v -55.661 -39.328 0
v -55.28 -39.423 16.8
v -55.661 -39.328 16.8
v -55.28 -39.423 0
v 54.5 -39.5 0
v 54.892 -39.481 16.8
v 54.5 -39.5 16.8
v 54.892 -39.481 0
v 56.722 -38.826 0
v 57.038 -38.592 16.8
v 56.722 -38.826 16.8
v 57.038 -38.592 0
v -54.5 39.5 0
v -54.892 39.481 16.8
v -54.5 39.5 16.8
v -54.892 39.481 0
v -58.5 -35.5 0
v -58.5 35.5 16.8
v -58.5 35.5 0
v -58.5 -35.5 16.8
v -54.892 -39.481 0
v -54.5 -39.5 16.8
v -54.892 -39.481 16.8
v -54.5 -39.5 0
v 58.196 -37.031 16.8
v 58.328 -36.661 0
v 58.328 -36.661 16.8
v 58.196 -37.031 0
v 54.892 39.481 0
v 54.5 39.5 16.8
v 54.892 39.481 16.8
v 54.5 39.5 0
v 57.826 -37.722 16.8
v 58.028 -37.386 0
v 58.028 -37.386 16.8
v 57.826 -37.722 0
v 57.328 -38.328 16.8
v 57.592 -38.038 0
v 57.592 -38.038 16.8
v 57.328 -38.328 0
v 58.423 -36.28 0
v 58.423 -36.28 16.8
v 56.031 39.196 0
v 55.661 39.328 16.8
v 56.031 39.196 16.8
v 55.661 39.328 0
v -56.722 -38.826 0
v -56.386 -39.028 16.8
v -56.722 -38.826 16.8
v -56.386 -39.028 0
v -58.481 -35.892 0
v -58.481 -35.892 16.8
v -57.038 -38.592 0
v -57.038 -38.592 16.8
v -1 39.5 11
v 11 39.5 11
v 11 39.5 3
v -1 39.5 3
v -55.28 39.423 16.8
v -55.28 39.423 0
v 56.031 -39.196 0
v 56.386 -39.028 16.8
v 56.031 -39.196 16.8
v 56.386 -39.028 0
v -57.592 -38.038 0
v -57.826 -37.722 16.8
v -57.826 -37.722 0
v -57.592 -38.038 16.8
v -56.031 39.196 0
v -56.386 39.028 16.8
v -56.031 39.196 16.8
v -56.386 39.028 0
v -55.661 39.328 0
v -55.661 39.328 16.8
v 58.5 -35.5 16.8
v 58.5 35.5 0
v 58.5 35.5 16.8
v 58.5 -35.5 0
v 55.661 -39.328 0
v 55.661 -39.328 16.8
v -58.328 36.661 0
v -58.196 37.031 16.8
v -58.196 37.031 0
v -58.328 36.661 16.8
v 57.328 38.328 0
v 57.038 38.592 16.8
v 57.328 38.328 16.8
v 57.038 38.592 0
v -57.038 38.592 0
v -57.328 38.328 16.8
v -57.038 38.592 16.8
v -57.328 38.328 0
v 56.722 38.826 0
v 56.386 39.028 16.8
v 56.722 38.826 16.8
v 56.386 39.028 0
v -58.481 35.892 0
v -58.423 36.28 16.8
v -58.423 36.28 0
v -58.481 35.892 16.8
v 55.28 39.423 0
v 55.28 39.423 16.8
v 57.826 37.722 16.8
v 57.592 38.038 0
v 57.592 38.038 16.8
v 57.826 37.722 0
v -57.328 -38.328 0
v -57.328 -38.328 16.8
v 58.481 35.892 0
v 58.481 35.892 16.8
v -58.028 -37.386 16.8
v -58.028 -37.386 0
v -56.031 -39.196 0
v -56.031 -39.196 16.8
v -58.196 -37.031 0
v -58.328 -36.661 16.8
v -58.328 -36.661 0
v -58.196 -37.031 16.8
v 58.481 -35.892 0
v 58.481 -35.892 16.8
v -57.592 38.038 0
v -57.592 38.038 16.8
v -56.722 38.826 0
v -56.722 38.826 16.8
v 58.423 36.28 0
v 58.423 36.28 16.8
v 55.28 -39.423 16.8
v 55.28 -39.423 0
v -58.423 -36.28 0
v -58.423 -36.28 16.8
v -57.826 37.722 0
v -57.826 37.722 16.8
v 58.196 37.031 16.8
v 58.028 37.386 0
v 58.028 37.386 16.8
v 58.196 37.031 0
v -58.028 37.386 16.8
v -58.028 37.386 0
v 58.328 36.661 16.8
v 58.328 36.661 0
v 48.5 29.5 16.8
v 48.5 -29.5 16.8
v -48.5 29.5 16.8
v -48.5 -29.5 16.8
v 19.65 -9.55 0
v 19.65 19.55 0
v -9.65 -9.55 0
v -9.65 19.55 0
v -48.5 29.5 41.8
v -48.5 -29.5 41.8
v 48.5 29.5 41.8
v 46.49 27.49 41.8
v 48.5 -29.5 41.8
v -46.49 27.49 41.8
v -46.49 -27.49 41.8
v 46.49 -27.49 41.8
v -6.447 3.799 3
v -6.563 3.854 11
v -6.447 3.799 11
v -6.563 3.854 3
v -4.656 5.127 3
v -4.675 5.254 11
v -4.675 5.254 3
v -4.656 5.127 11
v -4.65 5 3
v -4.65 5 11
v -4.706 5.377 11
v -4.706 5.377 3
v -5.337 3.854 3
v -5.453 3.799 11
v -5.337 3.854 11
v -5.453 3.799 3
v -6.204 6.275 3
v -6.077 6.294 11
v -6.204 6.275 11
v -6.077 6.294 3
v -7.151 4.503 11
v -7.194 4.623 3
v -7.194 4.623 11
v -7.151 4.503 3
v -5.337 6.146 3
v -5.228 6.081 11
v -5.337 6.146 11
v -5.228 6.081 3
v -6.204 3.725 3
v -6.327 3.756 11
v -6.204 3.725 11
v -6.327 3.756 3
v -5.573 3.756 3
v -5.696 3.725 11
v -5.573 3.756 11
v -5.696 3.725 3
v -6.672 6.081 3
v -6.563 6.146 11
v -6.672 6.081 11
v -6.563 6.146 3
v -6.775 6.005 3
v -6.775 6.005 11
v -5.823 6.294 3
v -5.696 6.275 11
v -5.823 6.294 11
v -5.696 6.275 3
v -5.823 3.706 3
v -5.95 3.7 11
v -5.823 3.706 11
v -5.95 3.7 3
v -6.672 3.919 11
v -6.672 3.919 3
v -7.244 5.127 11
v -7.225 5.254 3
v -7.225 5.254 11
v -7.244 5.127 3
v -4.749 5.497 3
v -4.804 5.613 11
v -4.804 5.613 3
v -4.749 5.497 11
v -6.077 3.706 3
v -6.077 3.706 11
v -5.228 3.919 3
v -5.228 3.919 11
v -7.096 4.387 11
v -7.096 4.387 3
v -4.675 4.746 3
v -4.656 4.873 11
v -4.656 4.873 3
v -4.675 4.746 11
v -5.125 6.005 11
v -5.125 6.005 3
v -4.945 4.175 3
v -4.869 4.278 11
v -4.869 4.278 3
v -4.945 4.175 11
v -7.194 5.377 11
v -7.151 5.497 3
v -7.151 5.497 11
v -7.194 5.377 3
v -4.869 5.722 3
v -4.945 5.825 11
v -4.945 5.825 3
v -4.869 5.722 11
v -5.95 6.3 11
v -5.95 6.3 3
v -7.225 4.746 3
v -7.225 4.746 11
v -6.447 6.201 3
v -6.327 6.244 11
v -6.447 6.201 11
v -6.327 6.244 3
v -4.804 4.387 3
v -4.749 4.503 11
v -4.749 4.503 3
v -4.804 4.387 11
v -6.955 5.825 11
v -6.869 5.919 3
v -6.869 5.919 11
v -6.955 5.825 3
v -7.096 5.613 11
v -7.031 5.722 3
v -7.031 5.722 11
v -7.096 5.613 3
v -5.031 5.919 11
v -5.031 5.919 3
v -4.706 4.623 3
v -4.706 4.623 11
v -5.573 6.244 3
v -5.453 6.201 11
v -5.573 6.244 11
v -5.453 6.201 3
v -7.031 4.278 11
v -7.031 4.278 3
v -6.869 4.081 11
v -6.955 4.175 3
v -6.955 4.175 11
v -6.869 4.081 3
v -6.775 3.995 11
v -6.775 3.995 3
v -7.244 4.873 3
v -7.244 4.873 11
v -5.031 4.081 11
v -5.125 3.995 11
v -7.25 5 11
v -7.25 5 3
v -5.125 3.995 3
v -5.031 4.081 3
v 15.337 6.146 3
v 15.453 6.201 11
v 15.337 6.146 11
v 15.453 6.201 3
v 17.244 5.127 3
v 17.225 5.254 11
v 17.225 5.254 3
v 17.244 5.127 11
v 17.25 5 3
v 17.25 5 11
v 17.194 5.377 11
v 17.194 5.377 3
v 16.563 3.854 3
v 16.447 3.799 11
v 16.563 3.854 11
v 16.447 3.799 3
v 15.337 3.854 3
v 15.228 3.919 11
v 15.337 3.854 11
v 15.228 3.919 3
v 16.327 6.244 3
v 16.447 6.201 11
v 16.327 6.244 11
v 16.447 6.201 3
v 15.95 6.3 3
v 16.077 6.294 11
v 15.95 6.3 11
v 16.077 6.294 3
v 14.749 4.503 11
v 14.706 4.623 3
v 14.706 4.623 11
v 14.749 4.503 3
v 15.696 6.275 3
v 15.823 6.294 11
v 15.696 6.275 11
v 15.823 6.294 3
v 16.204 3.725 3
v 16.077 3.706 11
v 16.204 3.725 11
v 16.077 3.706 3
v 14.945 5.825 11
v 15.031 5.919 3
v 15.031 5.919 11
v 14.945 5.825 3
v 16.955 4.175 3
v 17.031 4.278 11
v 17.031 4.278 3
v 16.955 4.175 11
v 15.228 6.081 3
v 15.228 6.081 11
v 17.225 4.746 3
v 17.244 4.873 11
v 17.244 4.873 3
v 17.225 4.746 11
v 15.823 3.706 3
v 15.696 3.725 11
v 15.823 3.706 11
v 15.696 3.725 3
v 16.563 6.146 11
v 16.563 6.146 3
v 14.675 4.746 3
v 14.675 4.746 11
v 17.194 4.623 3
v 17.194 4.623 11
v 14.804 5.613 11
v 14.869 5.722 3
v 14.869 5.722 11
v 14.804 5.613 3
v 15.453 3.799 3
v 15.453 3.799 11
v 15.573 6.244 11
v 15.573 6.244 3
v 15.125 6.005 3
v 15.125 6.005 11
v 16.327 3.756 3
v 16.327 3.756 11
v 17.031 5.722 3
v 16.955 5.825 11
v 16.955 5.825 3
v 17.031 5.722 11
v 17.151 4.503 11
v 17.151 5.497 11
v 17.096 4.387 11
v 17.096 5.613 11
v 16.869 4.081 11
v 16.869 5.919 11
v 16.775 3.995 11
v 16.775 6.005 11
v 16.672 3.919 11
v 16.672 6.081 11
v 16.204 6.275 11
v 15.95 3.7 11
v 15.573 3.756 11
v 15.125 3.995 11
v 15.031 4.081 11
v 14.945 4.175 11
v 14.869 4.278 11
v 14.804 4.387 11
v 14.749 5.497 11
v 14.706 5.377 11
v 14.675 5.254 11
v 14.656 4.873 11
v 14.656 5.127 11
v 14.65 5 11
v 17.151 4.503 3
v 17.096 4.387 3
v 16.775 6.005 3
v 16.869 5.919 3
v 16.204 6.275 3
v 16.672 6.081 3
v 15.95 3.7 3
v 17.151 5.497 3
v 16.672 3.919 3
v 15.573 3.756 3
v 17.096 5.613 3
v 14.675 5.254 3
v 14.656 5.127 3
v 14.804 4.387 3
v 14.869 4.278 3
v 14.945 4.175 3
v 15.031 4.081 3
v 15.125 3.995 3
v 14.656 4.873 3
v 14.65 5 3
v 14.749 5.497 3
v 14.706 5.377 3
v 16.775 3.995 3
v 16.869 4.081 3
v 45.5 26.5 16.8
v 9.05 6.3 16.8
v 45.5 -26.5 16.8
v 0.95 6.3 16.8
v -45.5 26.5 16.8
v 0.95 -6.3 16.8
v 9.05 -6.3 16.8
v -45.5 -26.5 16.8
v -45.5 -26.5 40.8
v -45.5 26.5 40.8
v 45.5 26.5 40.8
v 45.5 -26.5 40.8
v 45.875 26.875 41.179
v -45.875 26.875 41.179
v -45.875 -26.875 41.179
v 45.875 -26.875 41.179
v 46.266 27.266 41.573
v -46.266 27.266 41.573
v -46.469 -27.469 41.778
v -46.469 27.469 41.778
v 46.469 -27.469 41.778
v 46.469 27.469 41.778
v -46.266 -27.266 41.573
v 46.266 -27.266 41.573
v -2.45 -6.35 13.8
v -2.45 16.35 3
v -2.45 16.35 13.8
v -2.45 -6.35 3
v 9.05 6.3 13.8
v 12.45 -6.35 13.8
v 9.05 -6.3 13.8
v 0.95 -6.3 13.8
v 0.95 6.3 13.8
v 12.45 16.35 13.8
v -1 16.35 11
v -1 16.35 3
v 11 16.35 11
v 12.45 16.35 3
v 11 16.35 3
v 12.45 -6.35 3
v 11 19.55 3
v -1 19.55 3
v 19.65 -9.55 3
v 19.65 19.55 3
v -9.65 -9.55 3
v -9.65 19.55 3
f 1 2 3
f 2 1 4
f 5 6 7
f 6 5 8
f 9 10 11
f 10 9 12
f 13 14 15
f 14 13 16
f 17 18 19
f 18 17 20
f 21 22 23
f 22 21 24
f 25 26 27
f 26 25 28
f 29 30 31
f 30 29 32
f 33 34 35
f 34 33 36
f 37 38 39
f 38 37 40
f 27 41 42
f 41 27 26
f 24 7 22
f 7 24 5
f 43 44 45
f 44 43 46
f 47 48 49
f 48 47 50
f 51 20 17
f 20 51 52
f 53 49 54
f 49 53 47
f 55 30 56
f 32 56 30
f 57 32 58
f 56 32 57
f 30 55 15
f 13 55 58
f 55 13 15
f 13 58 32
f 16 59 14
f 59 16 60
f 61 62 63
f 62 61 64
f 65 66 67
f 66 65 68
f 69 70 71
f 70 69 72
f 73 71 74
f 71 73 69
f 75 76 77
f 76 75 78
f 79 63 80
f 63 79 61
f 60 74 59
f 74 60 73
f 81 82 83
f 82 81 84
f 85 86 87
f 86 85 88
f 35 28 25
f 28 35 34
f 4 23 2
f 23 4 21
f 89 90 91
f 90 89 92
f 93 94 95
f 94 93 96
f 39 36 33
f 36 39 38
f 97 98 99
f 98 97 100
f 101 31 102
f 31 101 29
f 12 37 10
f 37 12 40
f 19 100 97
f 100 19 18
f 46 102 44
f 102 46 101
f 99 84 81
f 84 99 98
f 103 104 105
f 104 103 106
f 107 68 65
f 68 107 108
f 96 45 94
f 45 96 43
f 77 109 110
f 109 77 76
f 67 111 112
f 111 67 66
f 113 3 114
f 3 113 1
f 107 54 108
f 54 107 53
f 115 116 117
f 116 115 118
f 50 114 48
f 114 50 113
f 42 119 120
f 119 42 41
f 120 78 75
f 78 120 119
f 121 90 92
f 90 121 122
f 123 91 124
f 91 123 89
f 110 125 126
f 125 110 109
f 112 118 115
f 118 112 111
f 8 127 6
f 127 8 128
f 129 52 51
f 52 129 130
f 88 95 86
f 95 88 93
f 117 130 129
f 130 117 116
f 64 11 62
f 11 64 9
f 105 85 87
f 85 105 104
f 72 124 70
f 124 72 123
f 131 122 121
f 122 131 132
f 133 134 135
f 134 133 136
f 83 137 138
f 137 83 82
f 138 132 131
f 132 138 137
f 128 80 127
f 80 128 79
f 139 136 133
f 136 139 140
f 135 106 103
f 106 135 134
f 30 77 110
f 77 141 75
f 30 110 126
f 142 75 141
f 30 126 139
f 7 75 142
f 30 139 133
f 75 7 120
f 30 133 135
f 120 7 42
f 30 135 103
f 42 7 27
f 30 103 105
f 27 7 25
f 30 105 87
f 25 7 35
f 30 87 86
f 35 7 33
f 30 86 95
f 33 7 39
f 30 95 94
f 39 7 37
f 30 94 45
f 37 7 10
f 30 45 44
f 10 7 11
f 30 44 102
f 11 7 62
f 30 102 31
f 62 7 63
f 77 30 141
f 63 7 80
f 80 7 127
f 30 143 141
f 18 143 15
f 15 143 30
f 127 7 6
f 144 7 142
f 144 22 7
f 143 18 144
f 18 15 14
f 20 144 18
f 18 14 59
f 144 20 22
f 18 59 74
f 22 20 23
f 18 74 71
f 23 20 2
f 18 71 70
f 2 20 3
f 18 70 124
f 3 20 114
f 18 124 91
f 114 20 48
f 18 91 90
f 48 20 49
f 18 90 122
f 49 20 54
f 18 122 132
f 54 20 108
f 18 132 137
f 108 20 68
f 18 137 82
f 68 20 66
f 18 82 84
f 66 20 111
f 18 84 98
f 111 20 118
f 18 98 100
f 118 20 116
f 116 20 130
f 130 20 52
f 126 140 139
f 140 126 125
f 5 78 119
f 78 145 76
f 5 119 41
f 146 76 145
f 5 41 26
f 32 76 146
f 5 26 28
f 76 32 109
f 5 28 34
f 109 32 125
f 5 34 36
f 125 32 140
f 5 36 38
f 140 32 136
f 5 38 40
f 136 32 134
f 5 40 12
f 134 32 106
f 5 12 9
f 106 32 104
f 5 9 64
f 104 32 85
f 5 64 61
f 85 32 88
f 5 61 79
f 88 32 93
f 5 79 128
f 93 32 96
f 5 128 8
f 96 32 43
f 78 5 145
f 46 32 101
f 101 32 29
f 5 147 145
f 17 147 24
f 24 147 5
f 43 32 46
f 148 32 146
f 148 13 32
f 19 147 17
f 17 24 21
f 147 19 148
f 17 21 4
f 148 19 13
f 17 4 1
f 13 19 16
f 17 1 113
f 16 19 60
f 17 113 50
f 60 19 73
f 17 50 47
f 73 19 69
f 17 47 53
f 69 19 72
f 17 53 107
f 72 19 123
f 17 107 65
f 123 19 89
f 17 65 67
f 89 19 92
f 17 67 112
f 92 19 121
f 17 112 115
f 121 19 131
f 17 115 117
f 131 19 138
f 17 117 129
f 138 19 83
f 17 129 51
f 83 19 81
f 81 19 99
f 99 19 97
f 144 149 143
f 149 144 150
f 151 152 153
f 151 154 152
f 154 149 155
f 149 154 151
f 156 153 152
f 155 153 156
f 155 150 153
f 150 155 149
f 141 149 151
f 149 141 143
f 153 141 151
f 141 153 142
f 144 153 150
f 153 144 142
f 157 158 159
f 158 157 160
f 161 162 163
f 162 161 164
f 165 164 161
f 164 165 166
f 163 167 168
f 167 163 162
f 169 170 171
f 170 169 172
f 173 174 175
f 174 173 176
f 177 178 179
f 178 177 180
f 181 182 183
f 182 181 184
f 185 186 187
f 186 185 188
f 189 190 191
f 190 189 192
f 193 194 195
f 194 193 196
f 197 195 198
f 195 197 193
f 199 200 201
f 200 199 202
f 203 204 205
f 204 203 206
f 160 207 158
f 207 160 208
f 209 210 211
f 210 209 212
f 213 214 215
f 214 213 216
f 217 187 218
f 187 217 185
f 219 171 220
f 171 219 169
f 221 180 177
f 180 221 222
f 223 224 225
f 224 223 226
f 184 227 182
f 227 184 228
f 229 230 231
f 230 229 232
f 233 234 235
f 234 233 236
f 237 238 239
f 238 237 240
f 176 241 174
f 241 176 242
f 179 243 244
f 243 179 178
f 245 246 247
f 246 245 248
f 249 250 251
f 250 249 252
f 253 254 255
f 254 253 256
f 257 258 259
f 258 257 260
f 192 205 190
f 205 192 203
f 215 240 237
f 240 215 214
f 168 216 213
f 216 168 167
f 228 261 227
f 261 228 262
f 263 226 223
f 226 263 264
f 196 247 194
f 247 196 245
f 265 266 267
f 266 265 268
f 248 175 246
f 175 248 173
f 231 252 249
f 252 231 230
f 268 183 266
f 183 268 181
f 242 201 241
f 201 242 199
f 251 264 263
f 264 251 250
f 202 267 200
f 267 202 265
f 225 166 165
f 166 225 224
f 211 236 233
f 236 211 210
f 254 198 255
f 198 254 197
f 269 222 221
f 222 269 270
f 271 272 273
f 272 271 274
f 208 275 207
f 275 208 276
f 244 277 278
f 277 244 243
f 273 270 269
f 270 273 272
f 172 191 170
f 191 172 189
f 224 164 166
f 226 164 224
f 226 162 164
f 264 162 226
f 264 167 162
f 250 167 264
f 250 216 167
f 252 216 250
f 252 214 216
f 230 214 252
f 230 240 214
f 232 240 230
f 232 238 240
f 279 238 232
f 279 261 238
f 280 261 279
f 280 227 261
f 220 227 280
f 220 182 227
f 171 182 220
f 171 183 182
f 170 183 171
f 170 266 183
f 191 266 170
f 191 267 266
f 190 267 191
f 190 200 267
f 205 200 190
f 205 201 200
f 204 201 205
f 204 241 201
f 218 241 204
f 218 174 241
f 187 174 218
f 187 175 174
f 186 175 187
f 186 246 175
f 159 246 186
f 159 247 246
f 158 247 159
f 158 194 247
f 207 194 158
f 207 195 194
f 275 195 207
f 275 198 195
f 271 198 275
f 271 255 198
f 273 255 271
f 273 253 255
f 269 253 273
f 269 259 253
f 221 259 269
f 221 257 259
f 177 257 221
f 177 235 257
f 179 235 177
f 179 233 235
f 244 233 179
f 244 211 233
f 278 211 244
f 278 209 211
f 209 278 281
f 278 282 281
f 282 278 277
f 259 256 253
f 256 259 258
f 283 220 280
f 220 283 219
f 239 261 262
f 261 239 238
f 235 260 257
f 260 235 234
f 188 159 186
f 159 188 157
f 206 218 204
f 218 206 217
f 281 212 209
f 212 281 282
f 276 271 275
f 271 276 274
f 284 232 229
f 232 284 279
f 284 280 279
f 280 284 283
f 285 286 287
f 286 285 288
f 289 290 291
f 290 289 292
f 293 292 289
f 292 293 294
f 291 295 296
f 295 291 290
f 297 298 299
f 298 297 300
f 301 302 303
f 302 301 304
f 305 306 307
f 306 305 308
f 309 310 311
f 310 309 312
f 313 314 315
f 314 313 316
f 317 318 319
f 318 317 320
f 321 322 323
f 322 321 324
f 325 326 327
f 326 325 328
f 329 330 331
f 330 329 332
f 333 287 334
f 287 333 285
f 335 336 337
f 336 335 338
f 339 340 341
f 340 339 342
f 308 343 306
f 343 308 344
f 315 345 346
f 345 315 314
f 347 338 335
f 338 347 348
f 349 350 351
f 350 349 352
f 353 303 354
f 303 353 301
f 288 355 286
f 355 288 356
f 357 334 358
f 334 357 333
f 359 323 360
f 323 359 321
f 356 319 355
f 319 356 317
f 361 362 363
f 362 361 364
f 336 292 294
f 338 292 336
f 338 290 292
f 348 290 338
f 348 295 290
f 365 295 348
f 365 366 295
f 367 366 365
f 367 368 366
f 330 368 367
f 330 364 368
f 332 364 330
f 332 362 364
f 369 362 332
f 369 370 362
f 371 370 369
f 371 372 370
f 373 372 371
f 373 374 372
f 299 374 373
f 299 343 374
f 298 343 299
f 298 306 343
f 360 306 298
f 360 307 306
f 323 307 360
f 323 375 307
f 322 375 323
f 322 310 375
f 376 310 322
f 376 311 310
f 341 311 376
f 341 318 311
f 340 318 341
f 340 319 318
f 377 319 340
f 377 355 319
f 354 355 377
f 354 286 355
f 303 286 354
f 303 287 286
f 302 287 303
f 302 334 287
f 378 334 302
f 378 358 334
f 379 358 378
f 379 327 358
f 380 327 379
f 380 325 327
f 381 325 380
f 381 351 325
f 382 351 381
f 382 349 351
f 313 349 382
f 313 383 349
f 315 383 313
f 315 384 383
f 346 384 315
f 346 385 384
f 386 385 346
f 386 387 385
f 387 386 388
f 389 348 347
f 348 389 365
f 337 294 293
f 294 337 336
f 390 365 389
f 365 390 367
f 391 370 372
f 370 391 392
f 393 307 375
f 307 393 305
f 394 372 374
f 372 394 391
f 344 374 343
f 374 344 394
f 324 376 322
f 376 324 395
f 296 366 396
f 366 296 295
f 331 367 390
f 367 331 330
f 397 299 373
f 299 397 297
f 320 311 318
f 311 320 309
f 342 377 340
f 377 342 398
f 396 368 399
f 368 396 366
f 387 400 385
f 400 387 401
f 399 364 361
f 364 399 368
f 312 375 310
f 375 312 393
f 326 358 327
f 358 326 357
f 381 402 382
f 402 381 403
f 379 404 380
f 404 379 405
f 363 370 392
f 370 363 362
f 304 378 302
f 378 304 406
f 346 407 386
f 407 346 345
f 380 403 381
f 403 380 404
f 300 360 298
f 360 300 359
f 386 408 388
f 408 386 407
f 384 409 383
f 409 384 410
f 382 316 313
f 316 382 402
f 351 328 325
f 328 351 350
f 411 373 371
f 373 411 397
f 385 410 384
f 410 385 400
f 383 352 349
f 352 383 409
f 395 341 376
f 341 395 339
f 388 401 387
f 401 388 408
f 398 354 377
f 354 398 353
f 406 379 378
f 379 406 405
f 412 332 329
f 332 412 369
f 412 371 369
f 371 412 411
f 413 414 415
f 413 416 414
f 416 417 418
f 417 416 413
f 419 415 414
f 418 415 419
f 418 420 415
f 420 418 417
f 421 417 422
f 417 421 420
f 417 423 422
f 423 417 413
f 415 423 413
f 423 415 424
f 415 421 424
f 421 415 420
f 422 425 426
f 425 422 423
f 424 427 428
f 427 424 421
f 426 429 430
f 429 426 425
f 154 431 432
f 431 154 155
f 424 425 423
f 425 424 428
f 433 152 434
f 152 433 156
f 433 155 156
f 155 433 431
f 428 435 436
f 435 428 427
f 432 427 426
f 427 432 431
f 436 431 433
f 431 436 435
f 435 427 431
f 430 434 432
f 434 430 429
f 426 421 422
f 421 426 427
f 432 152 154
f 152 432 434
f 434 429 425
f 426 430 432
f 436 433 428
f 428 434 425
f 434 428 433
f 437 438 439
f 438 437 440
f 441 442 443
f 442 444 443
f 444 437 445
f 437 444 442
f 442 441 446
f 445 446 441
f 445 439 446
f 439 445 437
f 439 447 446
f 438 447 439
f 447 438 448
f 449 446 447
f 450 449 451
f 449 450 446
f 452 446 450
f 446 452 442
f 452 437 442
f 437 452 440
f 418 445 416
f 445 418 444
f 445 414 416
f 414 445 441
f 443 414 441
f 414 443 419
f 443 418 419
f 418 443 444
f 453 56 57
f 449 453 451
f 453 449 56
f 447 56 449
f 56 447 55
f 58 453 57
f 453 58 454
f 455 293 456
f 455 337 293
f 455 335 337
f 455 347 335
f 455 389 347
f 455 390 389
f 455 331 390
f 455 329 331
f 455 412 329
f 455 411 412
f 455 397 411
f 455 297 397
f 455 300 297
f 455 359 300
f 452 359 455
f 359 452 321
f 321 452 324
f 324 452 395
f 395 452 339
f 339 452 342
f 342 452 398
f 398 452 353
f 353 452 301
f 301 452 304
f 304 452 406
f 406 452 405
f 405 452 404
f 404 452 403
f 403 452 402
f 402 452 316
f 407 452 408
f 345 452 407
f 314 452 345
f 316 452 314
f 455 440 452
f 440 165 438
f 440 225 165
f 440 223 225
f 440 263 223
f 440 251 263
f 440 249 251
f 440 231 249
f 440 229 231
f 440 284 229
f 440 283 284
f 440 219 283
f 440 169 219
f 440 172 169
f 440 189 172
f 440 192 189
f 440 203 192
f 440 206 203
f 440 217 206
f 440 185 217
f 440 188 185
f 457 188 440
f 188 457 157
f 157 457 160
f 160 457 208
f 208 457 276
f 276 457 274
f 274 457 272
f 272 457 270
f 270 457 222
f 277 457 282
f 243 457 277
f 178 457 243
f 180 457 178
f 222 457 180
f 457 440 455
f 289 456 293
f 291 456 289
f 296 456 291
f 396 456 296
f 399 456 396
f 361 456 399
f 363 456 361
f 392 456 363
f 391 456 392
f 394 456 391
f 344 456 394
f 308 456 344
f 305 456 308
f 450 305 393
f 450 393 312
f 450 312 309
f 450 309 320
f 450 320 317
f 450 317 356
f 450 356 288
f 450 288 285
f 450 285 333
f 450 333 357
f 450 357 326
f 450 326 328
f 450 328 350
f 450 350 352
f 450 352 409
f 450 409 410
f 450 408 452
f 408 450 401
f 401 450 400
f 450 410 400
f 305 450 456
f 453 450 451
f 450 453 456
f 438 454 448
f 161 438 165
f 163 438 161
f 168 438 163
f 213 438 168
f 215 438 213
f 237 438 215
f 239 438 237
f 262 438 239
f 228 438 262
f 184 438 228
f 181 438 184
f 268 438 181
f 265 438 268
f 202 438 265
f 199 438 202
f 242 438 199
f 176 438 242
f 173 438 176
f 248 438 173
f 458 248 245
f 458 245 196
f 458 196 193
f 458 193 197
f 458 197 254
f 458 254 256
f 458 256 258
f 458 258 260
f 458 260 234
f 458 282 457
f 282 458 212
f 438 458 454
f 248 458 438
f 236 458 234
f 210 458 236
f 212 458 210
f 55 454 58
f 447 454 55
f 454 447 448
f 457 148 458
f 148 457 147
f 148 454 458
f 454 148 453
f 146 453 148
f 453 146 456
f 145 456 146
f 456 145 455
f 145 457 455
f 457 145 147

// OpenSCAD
$fn = 64;
part = "stand"; // stand, cover, assembly (preview)

// X: former speaker height; Y: front (-) to back (+); left end faces down.
speaker_side_width = 90;
speaker_depth = 52;
speaker_clearance = 0.5; // Per side; the rectangular envelope is provisional.
guide_height = 25;
wall = 3;
foot_margin = 10;

// Measured housing: 14.3 x 22.1 x 10.5. Tip: 7.5 x 12; X/Y orientation provisional.
port_x = 5; // Provisional: 5 mm toward the buttons from the left-end center.
port_y = 0;
adapter_width = 14.3; // Cable-side housing envelope, X/Y/Z with contact facing up.
adapter_depth = 22.1;
adapter_height = 10.5;
adapter_clearance = 0.3; // Per side and above the housing.
contact_offset_y = -5; // Unmeasured: contact center relative to the housing center.
contact_width = 8.1; // 7.5 mm tip + 0.3 mm each side; provisional axis assignment.
contact_depth = 12.6; // 12 mm tip + 0.3 mm each side.
tip_projection = 3; // Seated speaker end to the coupled housing's top shoulder.
cable_width = 12; // Envelope of cable AND USB-C plug; exit toward +Y.
cable_height = 8;
pilot_diameter = 2.6; // M3 thread-forming pilot; tune for the printed material.

cover_thickness = 3;
lip = 1.5;
eps = 0.01;
inner_w = speaker_side_width + 2 * speaker_clearance;
inner_d = speaker_depth + 2 * speaker_clearance;
base_w = inner_w + 2 * (wall + foot_margin);
base_d = inner_d + 2 * (wall + foot_margin);
pocket_w = adapter_width + 2 * adapter_clearance;
pocket_d = adapter_depth + 2 * adapter_clearance;
holder_x = port_x;
holder_y = port_y - contact_offset_y;
shoulder_z = cover_thickness + adapter_height + adapter_clearance;
seat_z = shoulder_z + tip_projection;
plate_w = pocket_w + 14;
plate_d = pocket_d + 6;
screw_x = pocket_w / 2 + 3.5;

assert(part == "stand" || part == "cover" || part == "assembly");
assert(speaker_side_width > 0 && speaker_depth > 0 && speaker_clearance >= 0);
assert(wall >= 3 && foot_margin >= 3 && guide_height > 2);
assert(adapter_width > 0 && adapter_depth > 0 && adapter_height >= 8 && adapter_clearance >= 0);
assert(contact_width > 0 && contact_width <= adapter_width - 2 * lip,
  "The contact opening must leave housing shoulders to retain");
assert(contact_depth > 0 && abs(contact_offset_y) + contact_depth / 2 <= pocket_d / 2);
assert(tip_projection >= lip, "The device tip must reach below the retaining shoulder");
assert(cable_width > 0 && cable_width <= adapter_width && cable_height > 0 && cable_height <= adapter_height);
assert(pilot_diameter >= 2 && pilot_diameter < 3.4);
assert(abs(holder_x) + plate_w / 2 + 3 < base_w / 2 && abs(holder_y) + plate_d / 2 + 3 < base_d / 2,
  "The recessed cover must fit inside the foot");
assert(abs(port_x) + contact_width / 2 + 3 < inner_w / 2 && abs(port_y) + contact_depth / 2 + 3 < inner_d / 2,
  "Leave a supporting seat around the contact opening");

module screw_positions() {
  for (x = [-screw_x, screw_x]) translate([x, 0, 0]) children();
}

module stand() {
  difference() {
    union() {
      linear_extrude(seat_z)
        offset(r = 4) square([base_w - 8, base_d - 8], center = true);
      translate([0, 0, seat_z / 2])
        linear_extrude(seat_z / 2 + guide_height)
          square([inner_w + 2 * wall, inner_d + 2 * wall], center = true);
    }
    translate([0, 0, seat_z])
      linear_extrude(guide_height + eps) square([inner_w, inner_d], center = true);
    // The final 1 mm opens outward to guide insertion.
    translate([0, 0, seat_z + guide_height - 1])
      linear_extrude(1 + eps, scale = [(inner_w + 2) / inner_w, (inner_d + 2) / inner_d])
        square([inner_w, inner_d], center = true);
    translate([holder_x, holder_y, -eps])
      linear_extrude(shoulder_z + eps) square([pocket_w, pocket_d], center = true);
    translate([port_x, port_y, shoulder_z - eps])
      linear_extrude(tip_projection + 2 * eps) square([contact_width, contact_depth], center = true);
    translate([holder_x - cable_width / 2, holder_y, cover_thickness])
      cube([cable_width, base_d / 2 - holder_y + eps, cable_height]);
    translate([holder_x, holder_y, -eps])
      linear_extrude(cover_thickness + eps) square([plate_w + 0.4, plate_d + 0.4], center = true);
    translate([holder_x, holder_y, cover_thickness - eps])
      screw_positions() cylinder(d = pilot_diameter, h = 8 + eps);
  }
}

// Printed with the countersinks upward; flip over to assemble flush at Z=0.
module cover() {
  difference() {
    linear_extrude(cover_thickness) square([plate_w, plate_d], center = true);
    screw_positions() {
      translate([0, 0, -eps]) cylinder(d = 3.4, h = cover_thickness + 2 * eps);
      translate([0, 0, cover_thickness - 1.5]) cylinder(d1 = 3.4, d2 = 6.4 + 2 * eps, h = 1.5 + eps);
    }
  }
}

if (part == "cover") {
  cover();
} else {
  stand();
  if (part == "assembly") {
    translate([holder_x, holder_y, cover_thickness]) rotate([180, 0, 0]) cover();
    %translate([0, 0, seat_z]) linear_extrude(201)
      offset(r = speaker_depth / 2)
        square([speaker_side_width - speaker_depth, 0.01], center = true);
    %translate([holder_x, holder_y, cover_thickness])
      linear_extrude(adapter_height) square([adapter_width, adapter_depth], center = true);
  }
}
